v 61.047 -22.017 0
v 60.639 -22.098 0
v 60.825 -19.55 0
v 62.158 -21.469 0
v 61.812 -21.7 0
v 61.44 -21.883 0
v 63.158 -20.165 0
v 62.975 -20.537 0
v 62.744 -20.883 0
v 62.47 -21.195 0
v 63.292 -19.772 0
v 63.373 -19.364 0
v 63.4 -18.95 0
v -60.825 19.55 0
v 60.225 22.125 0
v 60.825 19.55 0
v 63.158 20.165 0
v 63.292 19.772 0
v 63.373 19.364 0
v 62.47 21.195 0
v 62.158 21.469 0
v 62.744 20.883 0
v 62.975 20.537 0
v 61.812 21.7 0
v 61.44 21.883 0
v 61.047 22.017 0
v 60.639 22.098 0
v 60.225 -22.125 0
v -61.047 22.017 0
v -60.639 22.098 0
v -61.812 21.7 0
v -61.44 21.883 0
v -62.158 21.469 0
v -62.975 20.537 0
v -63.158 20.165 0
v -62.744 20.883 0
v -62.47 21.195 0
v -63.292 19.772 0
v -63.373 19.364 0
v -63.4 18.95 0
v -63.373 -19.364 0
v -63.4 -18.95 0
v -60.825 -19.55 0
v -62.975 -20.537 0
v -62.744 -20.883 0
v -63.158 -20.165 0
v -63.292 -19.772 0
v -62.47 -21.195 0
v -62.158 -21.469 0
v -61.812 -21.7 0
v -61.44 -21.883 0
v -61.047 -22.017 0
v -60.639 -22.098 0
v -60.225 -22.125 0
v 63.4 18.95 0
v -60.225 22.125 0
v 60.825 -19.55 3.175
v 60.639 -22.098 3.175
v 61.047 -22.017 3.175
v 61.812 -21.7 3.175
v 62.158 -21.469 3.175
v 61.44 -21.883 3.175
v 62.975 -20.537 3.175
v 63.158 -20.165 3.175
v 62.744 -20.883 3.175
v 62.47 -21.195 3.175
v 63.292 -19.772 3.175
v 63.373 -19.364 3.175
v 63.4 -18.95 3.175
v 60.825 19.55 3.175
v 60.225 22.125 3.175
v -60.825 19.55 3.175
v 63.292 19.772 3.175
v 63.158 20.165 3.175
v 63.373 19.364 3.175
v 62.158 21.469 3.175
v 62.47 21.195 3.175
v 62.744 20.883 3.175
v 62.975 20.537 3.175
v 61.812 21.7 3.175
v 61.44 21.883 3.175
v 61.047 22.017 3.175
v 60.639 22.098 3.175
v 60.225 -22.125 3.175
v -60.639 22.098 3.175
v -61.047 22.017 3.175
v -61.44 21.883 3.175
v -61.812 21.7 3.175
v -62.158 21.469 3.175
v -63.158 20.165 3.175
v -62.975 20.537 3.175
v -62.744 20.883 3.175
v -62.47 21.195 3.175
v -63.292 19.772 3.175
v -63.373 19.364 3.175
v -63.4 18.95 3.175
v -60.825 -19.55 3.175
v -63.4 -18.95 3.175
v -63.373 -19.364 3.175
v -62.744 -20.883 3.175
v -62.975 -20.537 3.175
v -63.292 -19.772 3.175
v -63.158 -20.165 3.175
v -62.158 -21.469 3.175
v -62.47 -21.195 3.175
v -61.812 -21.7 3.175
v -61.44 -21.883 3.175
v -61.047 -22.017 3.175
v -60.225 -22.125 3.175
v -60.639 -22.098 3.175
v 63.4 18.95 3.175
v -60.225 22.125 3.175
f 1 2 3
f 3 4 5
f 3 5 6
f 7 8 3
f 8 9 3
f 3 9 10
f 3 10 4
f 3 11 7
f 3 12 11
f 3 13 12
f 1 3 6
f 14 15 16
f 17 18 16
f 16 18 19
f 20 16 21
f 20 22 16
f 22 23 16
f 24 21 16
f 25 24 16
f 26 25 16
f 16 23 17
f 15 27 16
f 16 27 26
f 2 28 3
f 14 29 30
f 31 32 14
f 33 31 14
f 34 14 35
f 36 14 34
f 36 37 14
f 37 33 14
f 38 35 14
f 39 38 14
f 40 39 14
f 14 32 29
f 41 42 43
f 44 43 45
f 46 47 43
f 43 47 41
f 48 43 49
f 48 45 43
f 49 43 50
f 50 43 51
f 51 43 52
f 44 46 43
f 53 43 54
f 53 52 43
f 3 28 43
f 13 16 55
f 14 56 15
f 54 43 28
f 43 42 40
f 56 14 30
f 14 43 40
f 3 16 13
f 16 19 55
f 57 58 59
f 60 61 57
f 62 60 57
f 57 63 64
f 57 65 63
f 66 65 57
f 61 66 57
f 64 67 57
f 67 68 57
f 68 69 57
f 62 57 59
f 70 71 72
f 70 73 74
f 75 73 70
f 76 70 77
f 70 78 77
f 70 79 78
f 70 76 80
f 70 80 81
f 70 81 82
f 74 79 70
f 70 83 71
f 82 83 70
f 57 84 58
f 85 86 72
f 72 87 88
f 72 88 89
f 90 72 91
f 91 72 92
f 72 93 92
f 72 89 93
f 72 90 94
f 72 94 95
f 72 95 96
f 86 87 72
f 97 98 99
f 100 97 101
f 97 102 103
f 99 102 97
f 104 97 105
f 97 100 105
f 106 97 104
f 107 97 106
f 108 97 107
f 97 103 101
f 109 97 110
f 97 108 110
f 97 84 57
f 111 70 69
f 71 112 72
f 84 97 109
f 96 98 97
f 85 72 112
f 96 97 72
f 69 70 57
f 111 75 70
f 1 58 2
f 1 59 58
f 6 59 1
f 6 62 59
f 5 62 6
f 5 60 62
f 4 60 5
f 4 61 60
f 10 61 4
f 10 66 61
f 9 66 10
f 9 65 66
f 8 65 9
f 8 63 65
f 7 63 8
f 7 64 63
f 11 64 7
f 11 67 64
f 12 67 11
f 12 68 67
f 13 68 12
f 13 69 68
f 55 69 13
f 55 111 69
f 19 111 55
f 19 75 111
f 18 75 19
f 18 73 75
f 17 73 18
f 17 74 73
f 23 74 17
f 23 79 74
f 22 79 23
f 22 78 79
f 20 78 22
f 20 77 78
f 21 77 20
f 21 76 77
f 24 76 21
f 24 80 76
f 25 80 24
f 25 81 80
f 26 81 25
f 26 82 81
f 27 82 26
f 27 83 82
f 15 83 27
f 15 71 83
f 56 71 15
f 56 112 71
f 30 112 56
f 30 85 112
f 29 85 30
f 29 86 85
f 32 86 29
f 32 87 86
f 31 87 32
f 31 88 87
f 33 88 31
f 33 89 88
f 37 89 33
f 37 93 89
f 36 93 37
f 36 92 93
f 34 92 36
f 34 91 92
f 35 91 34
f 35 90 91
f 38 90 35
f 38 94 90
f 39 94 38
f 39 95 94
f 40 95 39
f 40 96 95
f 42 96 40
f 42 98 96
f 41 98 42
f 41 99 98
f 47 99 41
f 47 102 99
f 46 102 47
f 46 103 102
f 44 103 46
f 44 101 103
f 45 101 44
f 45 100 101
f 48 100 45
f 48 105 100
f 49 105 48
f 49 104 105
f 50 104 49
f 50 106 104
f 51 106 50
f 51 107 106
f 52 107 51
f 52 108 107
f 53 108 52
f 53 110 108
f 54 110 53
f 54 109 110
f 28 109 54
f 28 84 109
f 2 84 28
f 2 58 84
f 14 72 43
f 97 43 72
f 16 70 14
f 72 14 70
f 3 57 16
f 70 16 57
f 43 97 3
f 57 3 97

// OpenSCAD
// file: ../../lib/TOGArrayLib1.scad
// TOGArrayLib1.4
// 
// Functions for working with arrays.
// 
// v1.1:
// - tal1_reduce assert(is_list(items)) to prevent infinite recursion
//   when given undefined or other non-list values
// v1.1.1:
// - Fix tal1_uniq_remap_v2 to return "list-remap-result" as the
//   first element of the returned list
// v1.2:
// - Add tal1_replace_at function
// v1.3:
// - tal1_is_vec_of, tal1_is_vec_of_num
// v1.4:
// - tal1_assert_for_each, for when you want to assert something
//   about each of a list of items and get nice failure messages

/**
 * Make a list with the contents of list `a`,
 * but starting at offset `off`, replaced by the contents of list `b`.
 * len(result) = max(len(a), off+len(b))
 */
function tal1_replace_at(a, off, b, default_value=undef, default_value_function=undef) =
	assert(is_list(a))
	assert(is_list(b))
	let( _dvf = !is_undef(default_value_function) ? default_value_function : function(i) default_value )
[
	for( i=[0:1:min(off,len(a))-1] ) a[i],
	for( i=[len(a):1:off-1] ) _dvf(i),
	for( i=[off:1:off+len(b)-1] ) b[i-off],
	for( i=[off+len(b):1:len(a)-1] ) a[i],
];

// Simplest case
assert([] == tal1_replace_at([], 0, []));
// Second simplest cases
assert(["foo"] == tal1_replace_at(["foo"], 0, []));
assert(["foo"] == tal1_replace_at([], 0, ["foo"]));
// Replace one item
assert(["foo","quux","baz"] == tal1_replace_at(["foo","bar","baz"], 1, ["quux"]));
// Replace and extend
assert(["foo","quux","tuna","tina"] == tal1_replace_at(["foo","bar","baz"], 1, ["quux", "tuna", "tina"]));
// Add beyond end of `a`
assert(["foo","zzz","quux"] == tal1_replace_at(["foo"], 2, ["quux"], default_value="zzz"));
// Adding 'nothing' should still fill to that point with defaults
assert(["foo","zzz","zzz"] == tal1_replace_at(["foo"], 3, [], default_value="zzz"));


function tal1_reduce(start, items, func, offset=0) =
	assert(is_list(items))
	len(items) == offset ? start :
	tal1_reduce(func(start, items[offset]), items, func, offset+1);

function tal1_consecutive_duplicate_count(items) = tal1_reduce(
	[0, undef],
	items,
	function(z,item) [z[0] + (item == z[1] ? 1 : 0), item]
)[0];

assert(0 == tal1_consecutive_duplicate_count([]));
assert(0 == tal1_consecutive_duplicate_count([50]));
assert(1 == tal1_consecutive_duplicate_count([50,50]));
assert(0 == tal1_consecutive_duplicate_count([50,51,52,53]));
assert(1 == tal1_consecutive_duplicate_count([50,51,52,52]));
assert(3 == tal1_consecutive_duplicate_count([50,50,50,50]));

// Set test_size to arbirarily large values
// to ensure that OpenSCAD can handle heavy recursion
let(test_size=1000) assert(test_size/2 == tal1_consecutive_duplicate_count([for(i=[0:1:test_size-1]) floor(i/2)]));



function tal1_uniq_(items, off0, off1) =
	let(chunklen = off1-off0)
	chunklen == 0 ? [] :
	chunklen == 1 ? [items[off0]] :
	let(half=floor(chunklen/2))
	let(left  = tal1_uniq_(items, off0     , off0+half))
	let(right = tal1_uniq_(items, off0+half, off1     ))
	assert(len(left) > 0)
	assert(len(right) > 0)
	left[len(left)-1] == right[0] ? [each left, for(i=[1:1:len(right)-1]) right[i]] :
	[each left, each right];

/** Given a list of items, returns a new list with identical consecutive items merged */
function tal1_uniq(items) = tal1_uniq_(items, 0, len(items));

assert([] == tal1_uniq([]));
assert([123] == tal1_uniq([123]));
assert([55,0,1,2,3] == tal1_uniq([55,0,1,2,3]));
assert([55,0,1,2] == tal1_uniq([55,0,1,1,2]));
assert([55,0,1] == tal1_uniq([55,55,0,0,0,0,0,0,1,1,1,1]));
assert([55,0] == tal1_uniq([55,0,0,0,0,0,0,0]));



/**
 * Returns [new items, old index -> new index mapping].
 * No-op version.
 */
function tal1_uniq_remap_v1(items) =
	["list-remap-result", items, [for (vi=[0:1:len(items)-1]) vi]];

// [a, a, b, b, c, c]
//
// [a,    ...], []  -> [a],[0]
// [a, a, ...], [0] -> [a],[0,0]

assert([1,2,3] == [1,2,3]);

/**
 * Recursive version that will combine adjacent identical vertexes,
 * but will use the original items.
 */
function tal1_uniq_remap_v2(items, map=[]) =
	let(index = len(map))
	len(items) == index ? ["list-remap-result", items, map] :
	index == 0 ? tal1_uniq_remap_v2(items, [0]) :
	items[index] == items[map[index-1]] ? tal1_uniq_remap_v2(items, [for(vi=map) vi, map[index-1]]) :
	tal1_uniq_remap_v2(items, [for(vi=map) vi, index]);

assert(tal1_uniq_remap_v2([1,1,2,2,3,4]) == ["list-remap-result", [1,1,2,2,3,4], [0,0,2,2,4,5]]);


/**
 * Returns true if `vec` is a list of at least min_len items
 * and component_check(each item, even those beyond min_len) is true.
 */
function tal1_is_vec_of(vec, min_len=0, component_check=function(x) true) =
	assert(is_num(min_len) && min_len >= 0)
	assert(is_function(component_check))
	is_list(vec) && len(vec) >= min_len &&
	tal1_reduce(true, vec, function(prev,item) prev && component_check(item));

function tal1_is_vec_of_num(vec, min_len=0) = tal1_is_vec_of(vec, min_len, function(i) is_num(i));

assert( true == tal1_is_vec_of_num([1,2,3]));
assert( true == tal1_is_vec_of_num([]));
assert( true == tal1_is_vec_of_num([1,2,3], 3));
assert(false == tal1_is_vec_of_num([1,2], 3));
assert(false == tal1_is_vec_of_num([1,2,"spoon"], 3));
// Requirements are ambiguous when
// first min_len items are numbers, but there are non-numeric items afterwards,
// so let's error on the side of saying 'no, it's not a list of numbers';
// i.e. the item check and the min_len are independent.
assert(false == tal1_is_vec_of_num([1,2,3,"artichoke"], 3));


/**
 * Asserts that item_checker(each item in list, index of item)[0] is true.
 * Second element of item_checker return value is assertion message.
 * Returns the original list, in case that's useful to you.
 */
function tal1_assert_for_each(list, item_checker) =
	let( _ignored = [ for(i=[0:1:len(list)-1])
		let(q=item_checker(list[i],i))
		let(passed=is_bool(q) ? q : is_list(q) ? q[0] : assert(false, str(
			"tal1_assert_for_each: item_checker should return Bool|[Bool,String], but returned ",
			q, " for item at index ", i)))
		let(message=is_list(q) ? q[1] : undef)
		assert(passed, message)
		q
	])
	list;

// Callback can return a boolean...
assert([1,2,3] == tal1_assert_for_each([1,2,3], function(v,i) is_num(v)));
// ...or a [boolean, string]
assert([1,2,3] == tal1_assert_for_each([1,2,3], function(v,i) [is_num(v), "element be a num"]));
// file: ../../lib/TOGMod1Constructors.scad
// TOGMod1Constructors-v1.7
// 
// Functions to construct objects understood by TOGMod1
// 
// v1.1:
// - Add togmod1_make_rounded_rect
// v1.2:
// - togmod1_make_rounded_rect can make ovals
// v1.3:
// - togmod1_circle_points, to just get the points of a circle
// - if pos parameter to circle function has a third element,
//   returned vertexes will include it as the z component;
// v1.3.1
// - Some assertions
// v1.4:
// - Refactor togmod1_rounded_rect_points and togmod1_circle_points
//   to use togmod1__make_nd_vector_adder for adapting to whatever
//   `pos` parameter is.
// v1.5:
// - togmod_rounded_rect_points will not simplify completely rounded sides
//   (where length of side is exactly twice the rounding radius)
//   unless simplify_rounded_sides=true
//   - This makes it more useful for polyhedron generation,
//     where radius varies, but number of points must remain constant.
// v1.6:
// - togmod1_make_rect makes a simple rectangle
// - togmod1_make_rounded_rect will defer to togmod1_make_rect when r=0
// v1.7:
// - togmod1_make_circle will return empty shape (["union"]) when d=0

use <./TOGArrayLib1.scad>

function togmod1__make_nd_vector_adder(origin=[0,0]) =
	let(origin_is_zero = tal1_reduce(true, origin, function(prev,item) prev && item == 0))
	origin_is_zero ? (function(vec) len(vec) >= len(origin) ? vec : tal1_replace_at(origin, 0, vec)) :
	function(vec) [
		for(i=[0:1:max(len(origin),len(vec))-1]) (len(vec) > i ? vec[i] : 0) + (len(origin) > i ? origin[i] : 0),
	];

assert([1,2,3] == togmod1__make_nd_vector_adder()([1,2,3]));
echo(togmod1__make_nd_vector_adder([0,0,3])([1,2]));
assert([1,2,3] == togmod1__make_nd_vector_adder([0,0,3])([1,2]));


function togmod1_make_cuboid(size) =
	assert(is_list(size))
	assert(len(size) >= 3)
	assert(is_num(size[0]))
	assert(is_num(size[1]))
	assert(is_num(size[2]))
	["polyhedron-vf", [
		[-size[0]/2, -size[1]/2, -size[2]/2],
		[+size[0]/2, -size[1]/2, -size[2]/2],
		[-size[0]/2, +size[1]/2, -size[2]/2],
		[+size[0]/2, +size[1]/2, -size[2]/2],
		[-size[0]/2, -size[1]/2, +size[2]/2],
		[+size[0]/2, -size[1]/2, +size[2]/2],
		[-size[0]/2, +size[1]/2, +size[2]/2],
		[+size[0]/2, +size[1]/2, +size[2]/2]
	], [
		[0,1,3,2],[0,4,5,1],[4,6,7,5],[3,7,6,2],[1,5,7,3],[6,4,0,2]
	]];

function togmod1_make_polygon(verts) =
	["polygon-vp", verts, [[for( i=[0:1:len(verts)-1] ) i%len(verts)]]];

function togmod1_rounded_rect_points(size, r, pos=[0,0], simplify_rounded_sides=false) =
	assert(is_list(size))
	assert(len(size) >= 2)
	let(radii = is_list(r) ? r : is_num(r) ? [r,r] : assert(false, "rounded_rect r(adius) should be list<num> or num"))
	let(rx = radii[0])
	let(ry = radii[1])
	assert(is_num(rx))
	assert(is_num(ry))
	assert(size[0] >= 2*rx, str("size[0] must be >= 2*r[0]; size[0] = ",size[0],", 2*r[0] = ",2*rx))
	assert(size[1] >= 2*ry, str("size[1] must be >= 2*r[1]; size[1] = ",size[1],", 2*r[1] = ",2*ry))
	let(quarterfn=max($fn/4, 1))
	let(qfnx = simplify_rounded_sides && size[0] == 2*rx ? quarterfn-1 : quarterfn)
	let(qfny = simplify_rounded_sides && size[1] == 2*ry ? quarterfn-1 : quarterfn)
	let(finalizepos = togmod1__make_nd_vector_adder(pos))
[
	for(a=[0 : 1 : qfnx]) let(ang=      a*90/quarterfn) finalizepos([ size[0]/2-rx + rx*cos(ang),  size[1]/2-ry + ry*sin(ang)]),
	for(a=[0 : 1 : qfny]) let(ang= 90 + a*90/quarterfn) finalizepos([-size[0]/2+rx + rx*cos(ang),  size[1]/2-ry + ry*sin(ang)]),
	for(a=[0 : 1 : qfnx]) let(ang=180 + a*90/quarterfn) finalizepos([-size[0]/2+rx + rx*cos(ang), -size[1]/2+ry + ry*sin(ang)]),
	for(a=[0 : 1 : qfny]) let(ang=270 + a*90/quarterfn) finalizepos([ size[0]/2-rx + rx*cos(ang), -size[1]/2+ry + ry*sin(ang)]),
];

function togmod1_make_rect(size) =
	togmod1_make_polygon([
		[-size[0]/2, -size[1]/2],
		[+size[0]/2, -size[1]/2],
		[+size[0]/2, +size[1]/2],
		[-size[0]/2, +size[1]/2],
	]);

function togmod1_make_rounded_rect(size, r) =
	r == 0 ? togmod1_make_rect(size) :
	togmod1_make_polygon(togmod1_rounded_rect_points(size,r,simplify_rounded_sides=true));

function togmod1_circle_points(r, pos=[0,0], d=undef) =
	assert( !is_undef(r) || !is_undef(d) )
	assert(!is_undef(pos[0]))
	assert(!is_undef(pos[1]))
	let(finalizepos = togmod1__make_nd_vector_adder(pos))
	let(r_ = !is_undef(r) ? r : d/2)
	let(fn = max($fn, 6))
	[for(i=[0 : 1 : fn-1]) finalizepos([r_*cos(i*360/fn), r_*sin(i*360/fn)])];

function togmod1_make_circle(r, pos=[0,0], d=undef) =
	r == 0 || d == 0 ? ["union"] :
	togmod1_make_polygon(togmod1_circle_points(r=r, pos=pos, d=d));

function togmod1_make_cylinder(d, zrange=[0,1], r=undef, pos=[0,0]) =
	assert( !is_undef(r) || !is_undef(d) )
	let( r_ = !is_undef(r) ? r : d/2 )
	// TODO: Make polyhedron directly
	["linear-extrude-zs", zrange, togmod1_make_circle(r=r_, pos=pos)];

function togmod1__is_range1d(range) = is_list(range) && len(range) == 2 && is_num(range[0]) && is_num(range[1]);

function togmod1_linear_extrude_z(range, shape) =
	assert(togmod1__is_range1d(range))
	["linear-extrude-zs", range, shape];
function togmod1_linear_extrude_x(range, shape) =
	assert(togmod1__is_range1d(range))
	["rotate", [90, 0, 90], togmod1_linear_extrude_z(range, shape)];
function togmod1_linear_extrude_y(range, shape) =
	assert(togmod1__is_range1d(range))
	["rotate", [90, 0, 180], togmod1_linear_extrude_z(range, shape)];
// file: ../../lib/TOGMod1.scad
// TOGMod1
// OpenSCAD library for representing shapes
// 
// See also: Functional OpenSCAD (https://github.com/thehans/FunctionalOpenSCAD)

module togmod1_domodule(mod) {
	assert(is_list(mod));
	assert(len(mod) > 0);
	if( mod[0] == "polygon-vp" ) {
		// ["polygon-vp", vertexes, paths]
		polygon(points=mod[1], paths=mod[2]);
	} else if( mod[0] == "polyhedron-vf" ) {
		polyhedron(mod[1], faces=mod[2]);
	} else if( mod[0] == "scale" ) {
		assert(len(mod) == 3);
		scale(mod[1]) togmod1_domodule(mod[2]);
	} else if( mod[0] == "translate" ) {
		assert(len(mod) == 3);
		assert(is_list(mod[1]));
		for(c=mod[1]) assert(is_num(c), "translate component should be numeric");
		translate(mod[1]) togmod1_domodule(mod[2]);
	} else if( mod[0] == "rotate" ) {
		assert(len(mod) == 3);
		rotate(mod[1]) togmod1_domodule(mod[2]);
	} else if( mod[0] == "intersection" ) {
		intersection_for( i=[1:1:len(mod)-1] ) togmod1_domodule(mod[i]);
	} else if( mod[0] == "difference" ) {
		difference() {
			togmod1_domodule(mod[1]);
			for( i=[2:1:len(mod)-1] ) togmod1_domodule(mod[i]);
		}
	} else if( mod[0] == "union" ) {
		for( i=[1:1:len(mod)-1] ) togmod1_domodule(mod[i]);
	} else if( mod[0] == "hull" ) {
		hull() for( i=[1:1:len(mod)-1] ) togmod1_domodule(mod[i]);
	} else if( mod[0] == "offset-rs" ) {
		assert(len(mod) == 3);
		assert(is_num(mod[1]));
		assert(is_list(mod[2]));
		offset(mod[1]) togmod1_domodule(mod[2]);
	} else if( mod[0] == "linear-extrude-zs" ) {
		// ["linear-extrude-zs", [z0,z1], 2d_shape] // centered
		// ["linear-extrude-zs", height, 2d_shape]
		let( zrange = is_list(mod[1]) ? mod[1] : [-mod[1]/2, mod[1]/2] ) {
			translate([0,0,zrange[0]]) linear_extrude(zrange[1]-zrange[0]) togmod1_domodule(mod[2]);
		}
	} else if( mod[0] == "render" ) {
		render() togmod1_domodule(mod[1]);
	} else if( mod[0] == "minkowski" ) {
		minkowski() {
			togmod1_domodule(mod[1]);
			togmod1_domodule(mod[2]);
		}
	} else if( mod[0] == "x-debug" ) {
		# togmod1_domodule(mod[1]);
	} else if( mod[0] == "x-color" ) {
		color(mod[1]) togmod1_domodule(mod[2]);
	} else {
		assert(false, str("Unrecognized shape: ", mod[0]));
	}
}
// main file
// OumaxSideSizeTester0.1

use <../../lib/TOGMod1.scad>
use <../../lib/TOGMod1Constructors.scad>

outer_margin = 0.1;
inner_margin = 0.5;
$fn = 48;

module oumaxholder0__end_params() { }

inch = 25.4;

side_size_tester = togmod1_linear_extrude_z([0, 3.175], ["difference",
	togmod1_make_rounded_rect([5*inch - outer_margin*2, (1+3/4)*inch - outer_margin*2], r=3.175),
	
	togmod1_make_rounded_rect([4.75*inch + inner_margin*2, 1.5*inch + inner_margin*2], r=0),
]);

togmod1_domodule(side_size_tester);
